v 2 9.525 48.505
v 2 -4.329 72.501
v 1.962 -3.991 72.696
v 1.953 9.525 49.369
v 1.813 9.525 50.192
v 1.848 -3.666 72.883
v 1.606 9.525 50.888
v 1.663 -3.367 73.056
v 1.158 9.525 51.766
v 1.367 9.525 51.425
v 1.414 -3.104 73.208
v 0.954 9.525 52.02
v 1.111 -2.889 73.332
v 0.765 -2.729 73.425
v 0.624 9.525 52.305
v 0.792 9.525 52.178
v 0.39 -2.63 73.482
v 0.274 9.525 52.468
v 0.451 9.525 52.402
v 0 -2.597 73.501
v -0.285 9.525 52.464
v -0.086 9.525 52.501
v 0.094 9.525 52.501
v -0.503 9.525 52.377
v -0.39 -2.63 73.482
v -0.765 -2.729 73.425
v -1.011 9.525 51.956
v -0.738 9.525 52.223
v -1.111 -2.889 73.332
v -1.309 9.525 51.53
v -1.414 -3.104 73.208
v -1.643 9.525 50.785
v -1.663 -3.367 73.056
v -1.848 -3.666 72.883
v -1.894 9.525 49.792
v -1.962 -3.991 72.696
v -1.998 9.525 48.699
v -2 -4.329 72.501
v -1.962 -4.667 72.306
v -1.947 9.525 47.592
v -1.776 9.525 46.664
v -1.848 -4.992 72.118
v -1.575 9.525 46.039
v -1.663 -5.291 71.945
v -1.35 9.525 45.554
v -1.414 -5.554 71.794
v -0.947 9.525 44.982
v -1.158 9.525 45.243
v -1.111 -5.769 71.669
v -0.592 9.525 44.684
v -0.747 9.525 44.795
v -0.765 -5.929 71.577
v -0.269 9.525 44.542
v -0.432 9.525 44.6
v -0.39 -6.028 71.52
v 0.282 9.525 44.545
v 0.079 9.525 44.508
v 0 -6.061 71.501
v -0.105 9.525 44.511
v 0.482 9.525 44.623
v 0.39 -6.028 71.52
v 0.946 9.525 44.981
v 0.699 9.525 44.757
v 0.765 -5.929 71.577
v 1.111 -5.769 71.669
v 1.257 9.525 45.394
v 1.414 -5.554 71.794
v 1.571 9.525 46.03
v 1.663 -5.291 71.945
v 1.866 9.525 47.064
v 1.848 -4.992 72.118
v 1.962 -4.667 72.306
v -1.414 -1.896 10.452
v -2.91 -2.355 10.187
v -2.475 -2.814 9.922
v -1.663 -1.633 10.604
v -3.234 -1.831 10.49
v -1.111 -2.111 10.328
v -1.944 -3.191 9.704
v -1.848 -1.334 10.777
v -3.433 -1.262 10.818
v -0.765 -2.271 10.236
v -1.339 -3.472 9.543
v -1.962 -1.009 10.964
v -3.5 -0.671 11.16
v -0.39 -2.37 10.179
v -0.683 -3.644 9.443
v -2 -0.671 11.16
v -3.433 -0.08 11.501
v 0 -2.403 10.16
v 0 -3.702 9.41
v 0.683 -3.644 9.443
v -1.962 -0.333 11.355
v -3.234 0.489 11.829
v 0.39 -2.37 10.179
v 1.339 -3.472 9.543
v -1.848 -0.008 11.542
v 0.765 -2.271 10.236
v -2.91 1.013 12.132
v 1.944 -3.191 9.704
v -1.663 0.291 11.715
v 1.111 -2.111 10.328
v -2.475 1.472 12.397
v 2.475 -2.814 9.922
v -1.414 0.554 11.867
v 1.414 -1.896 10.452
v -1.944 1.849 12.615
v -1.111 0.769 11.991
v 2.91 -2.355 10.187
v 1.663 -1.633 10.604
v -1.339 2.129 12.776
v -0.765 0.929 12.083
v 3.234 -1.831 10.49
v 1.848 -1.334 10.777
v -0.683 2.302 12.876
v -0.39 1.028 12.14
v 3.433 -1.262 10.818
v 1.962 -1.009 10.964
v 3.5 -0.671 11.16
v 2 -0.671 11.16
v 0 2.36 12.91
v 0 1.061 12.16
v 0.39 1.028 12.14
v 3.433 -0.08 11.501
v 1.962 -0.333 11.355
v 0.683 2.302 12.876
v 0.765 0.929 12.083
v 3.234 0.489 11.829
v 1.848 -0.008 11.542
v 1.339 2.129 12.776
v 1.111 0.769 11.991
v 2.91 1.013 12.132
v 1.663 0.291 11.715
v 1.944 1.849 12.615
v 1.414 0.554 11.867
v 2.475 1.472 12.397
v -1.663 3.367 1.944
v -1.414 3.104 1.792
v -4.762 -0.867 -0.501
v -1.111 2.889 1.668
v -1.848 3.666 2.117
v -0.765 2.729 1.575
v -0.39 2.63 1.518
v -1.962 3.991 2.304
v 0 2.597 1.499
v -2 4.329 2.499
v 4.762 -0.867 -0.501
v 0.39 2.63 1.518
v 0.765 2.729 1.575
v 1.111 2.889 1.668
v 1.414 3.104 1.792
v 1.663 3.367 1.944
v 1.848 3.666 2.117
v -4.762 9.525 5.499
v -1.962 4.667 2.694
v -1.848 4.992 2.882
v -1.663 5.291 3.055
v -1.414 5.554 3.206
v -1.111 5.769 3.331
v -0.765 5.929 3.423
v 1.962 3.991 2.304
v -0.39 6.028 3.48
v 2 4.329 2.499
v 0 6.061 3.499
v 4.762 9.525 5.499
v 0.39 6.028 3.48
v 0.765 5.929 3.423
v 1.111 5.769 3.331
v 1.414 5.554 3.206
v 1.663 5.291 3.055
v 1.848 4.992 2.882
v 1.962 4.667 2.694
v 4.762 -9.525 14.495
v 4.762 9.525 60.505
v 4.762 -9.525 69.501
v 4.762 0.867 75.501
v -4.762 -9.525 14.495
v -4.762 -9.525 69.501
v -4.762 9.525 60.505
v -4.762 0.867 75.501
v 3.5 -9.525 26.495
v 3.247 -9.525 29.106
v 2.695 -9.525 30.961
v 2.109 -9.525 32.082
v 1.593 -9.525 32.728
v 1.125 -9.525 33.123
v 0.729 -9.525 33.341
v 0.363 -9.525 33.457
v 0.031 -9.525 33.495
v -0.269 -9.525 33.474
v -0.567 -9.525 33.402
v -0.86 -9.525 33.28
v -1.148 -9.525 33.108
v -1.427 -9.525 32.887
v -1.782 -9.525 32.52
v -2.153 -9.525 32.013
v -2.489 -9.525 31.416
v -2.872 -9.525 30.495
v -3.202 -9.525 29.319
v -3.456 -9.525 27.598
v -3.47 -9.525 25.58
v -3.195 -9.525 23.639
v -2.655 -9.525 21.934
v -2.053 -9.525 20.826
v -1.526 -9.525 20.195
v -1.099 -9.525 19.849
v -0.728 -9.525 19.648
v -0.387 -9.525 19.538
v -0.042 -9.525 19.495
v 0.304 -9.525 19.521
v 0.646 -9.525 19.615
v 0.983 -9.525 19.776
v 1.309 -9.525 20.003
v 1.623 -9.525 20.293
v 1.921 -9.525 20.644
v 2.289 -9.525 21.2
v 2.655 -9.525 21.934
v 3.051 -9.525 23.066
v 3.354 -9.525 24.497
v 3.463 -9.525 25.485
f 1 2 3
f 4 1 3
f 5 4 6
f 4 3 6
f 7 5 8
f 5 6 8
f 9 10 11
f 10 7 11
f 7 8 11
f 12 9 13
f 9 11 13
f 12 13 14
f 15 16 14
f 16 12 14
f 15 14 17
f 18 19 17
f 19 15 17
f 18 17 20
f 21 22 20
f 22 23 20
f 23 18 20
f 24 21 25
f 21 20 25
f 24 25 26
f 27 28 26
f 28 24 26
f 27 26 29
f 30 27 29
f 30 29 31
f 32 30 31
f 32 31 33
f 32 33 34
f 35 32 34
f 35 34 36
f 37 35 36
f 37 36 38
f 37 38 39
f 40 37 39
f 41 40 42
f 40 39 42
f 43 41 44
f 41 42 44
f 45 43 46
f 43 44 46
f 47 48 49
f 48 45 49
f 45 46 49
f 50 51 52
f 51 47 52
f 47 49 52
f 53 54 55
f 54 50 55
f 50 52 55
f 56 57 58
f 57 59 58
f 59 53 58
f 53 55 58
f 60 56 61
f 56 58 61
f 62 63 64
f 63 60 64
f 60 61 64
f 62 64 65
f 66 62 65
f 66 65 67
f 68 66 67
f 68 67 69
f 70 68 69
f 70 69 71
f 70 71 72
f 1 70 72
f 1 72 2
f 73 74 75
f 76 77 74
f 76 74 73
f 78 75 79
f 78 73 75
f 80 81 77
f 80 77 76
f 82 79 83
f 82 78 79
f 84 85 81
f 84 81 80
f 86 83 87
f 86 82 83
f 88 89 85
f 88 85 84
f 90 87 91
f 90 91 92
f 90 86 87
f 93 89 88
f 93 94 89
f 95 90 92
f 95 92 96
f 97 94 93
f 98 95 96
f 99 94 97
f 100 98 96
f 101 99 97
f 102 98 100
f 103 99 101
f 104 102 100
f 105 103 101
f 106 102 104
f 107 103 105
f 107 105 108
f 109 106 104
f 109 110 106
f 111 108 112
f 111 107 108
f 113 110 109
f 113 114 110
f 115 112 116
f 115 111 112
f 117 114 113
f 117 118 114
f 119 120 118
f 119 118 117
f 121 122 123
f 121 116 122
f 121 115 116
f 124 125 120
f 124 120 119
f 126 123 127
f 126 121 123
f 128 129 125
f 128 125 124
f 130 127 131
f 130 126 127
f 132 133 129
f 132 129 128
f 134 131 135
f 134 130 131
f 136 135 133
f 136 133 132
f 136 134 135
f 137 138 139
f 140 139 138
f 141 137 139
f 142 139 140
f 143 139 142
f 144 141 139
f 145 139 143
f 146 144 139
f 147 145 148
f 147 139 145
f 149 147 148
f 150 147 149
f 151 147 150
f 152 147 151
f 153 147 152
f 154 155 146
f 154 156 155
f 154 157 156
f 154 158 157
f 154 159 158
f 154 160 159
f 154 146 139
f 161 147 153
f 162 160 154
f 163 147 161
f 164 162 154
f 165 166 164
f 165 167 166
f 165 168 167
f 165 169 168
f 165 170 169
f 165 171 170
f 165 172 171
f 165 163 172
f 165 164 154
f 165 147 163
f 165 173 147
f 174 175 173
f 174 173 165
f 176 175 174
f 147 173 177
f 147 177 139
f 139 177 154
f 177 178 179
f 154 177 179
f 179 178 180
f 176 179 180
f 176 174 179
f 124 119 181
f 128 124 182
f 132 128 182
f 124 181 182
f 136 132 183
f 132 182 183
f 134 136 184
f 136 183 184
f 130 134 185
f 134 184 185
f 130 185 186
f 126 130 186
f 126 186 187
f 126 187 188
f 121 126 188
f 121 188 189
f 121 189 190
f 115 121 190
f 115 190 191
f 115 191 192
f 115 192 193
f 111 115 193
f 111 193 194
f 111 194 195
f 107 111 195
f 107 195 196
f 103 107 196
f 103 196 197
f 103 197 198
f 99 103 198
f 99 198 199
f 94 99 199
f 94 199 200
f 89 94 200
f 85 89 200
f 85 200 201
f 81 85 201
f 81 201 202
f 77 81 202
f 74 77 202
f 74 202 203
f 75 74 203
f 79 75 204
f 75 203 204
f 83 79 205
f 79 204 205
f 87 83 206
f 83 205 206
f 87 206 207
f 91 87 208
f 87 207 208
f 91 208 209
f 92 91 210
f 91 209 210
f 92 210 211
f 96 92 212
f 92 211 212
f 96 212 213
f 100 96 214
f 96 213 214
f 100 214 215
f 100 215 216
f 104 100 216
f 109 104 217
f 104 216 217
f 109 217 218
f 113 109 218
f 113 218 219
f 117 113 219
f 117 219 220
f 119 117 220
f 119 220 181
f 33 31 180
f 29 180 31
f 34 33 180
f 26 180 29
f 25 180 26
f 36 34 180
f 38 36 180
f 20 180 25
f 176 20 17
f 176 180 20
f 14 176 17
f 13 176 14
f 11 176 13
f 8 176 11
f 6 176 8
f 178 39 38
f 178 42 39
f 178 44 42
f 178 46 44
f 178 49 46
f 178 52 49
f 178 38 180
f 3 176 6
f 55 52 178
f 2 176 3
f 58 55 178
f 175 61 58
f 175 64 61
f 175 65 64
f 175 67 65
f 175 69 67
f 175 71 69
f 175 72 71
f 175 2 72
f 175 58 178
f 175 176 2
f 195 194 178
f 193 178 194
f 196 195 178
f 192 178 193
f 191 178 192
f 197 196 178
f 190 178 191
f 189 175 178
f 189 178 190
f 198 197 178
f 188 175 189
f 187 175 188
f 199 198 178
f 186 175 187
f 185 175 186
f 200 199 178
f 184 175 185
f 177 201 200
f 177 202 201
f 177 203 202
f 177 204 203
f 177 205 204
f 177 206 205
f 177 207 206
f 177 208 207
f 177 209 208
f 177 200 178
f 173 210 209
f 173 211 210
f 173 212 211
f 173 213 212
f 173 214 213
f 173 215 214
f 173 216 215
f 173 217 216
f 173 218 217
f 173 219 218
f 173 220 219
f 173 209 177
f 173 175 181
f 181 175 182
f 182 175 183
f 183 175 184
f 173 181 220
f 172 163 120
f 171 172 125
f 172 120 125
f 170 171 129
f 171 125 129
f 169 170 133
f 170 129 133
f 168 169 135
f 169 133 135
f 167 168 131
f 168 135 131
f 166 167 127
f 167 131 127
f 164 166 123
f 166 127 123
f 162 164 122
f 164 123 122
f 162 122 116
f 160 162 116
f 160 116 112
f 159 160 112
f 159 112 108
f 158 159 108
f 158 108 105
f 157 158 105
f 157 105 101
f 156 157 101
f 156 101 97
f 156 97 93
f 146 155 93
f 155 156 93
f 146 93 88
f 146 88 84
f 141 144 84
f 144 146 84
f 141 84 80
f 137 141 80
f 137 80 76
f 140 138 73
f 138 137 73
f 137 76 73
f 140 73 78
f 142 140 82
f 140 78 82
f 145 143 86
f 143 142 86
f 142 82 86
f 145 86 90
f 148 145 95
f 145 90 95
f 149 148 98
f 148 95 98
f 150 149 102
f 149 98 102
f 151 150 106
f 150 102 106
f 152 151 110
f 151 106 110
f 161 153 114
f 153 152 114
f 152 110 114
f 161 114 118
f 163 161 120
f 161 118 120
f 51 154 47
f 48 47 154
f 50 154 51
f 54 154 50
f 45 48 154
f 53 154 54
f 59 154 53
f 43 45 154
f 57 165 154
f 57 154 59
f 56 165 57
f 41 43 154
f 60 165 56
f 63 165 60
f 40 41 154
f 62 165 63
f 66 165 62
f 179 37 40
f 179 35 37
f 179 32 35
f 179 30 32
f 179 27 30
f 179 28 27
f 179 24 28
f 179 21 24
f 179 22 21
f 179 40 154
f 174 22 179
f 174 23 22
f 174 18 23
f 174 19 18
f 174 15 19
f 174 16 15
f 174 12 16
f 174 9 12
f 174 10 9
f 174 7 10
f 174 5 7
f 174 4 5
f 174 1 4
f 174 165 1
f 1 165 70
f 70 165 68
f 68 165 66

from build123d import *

# Parameters (mm, degrees)
F1_DEPTH = 4.7625
F2_R     = 2
F3_DEPTH = 50
F4_R     = 3.5
F4_R_2   = 2
F5_DEPTH = 40
F6_R     = 2
F7_DEPTH = 15.1971524227
F8_R     = 2
F9_DEPTH = 70.1490577065


# Not quite as in the source:
# - a length typed as a fraction of an inch, garbled in the dataset ("3 / 203.2 mm" for 3/8 in), is restored


with BuildPart() as f1:
    # F0 (on Right) → F1 (new body, symmetric)
    with BuildSketch(Plane.YZ):
        Polygon((0.8673048454, 75.500738686), (-9.525, 69.500738686), (-9.525, 14.4948291982), (-0.8673048454, -0.500738686), (9.525, 5.499261314), (9.525, 60.5051708018), align=None)
    extrude(amount=F1_DEPTH, both=True)

    # F2 (on face) → F3 (join)
    with BuildSketch(Plane(origin=(0, 0, 0), x_dir=(1, 0, 0), z_dir=(0, 0.5, -0.8660254038))):
        with Locations((0, -4.9985226281)):
            Circle(F2_R)
    extrude(amount=-F3_DEPTH)

    # F4 (on face) → F5 (cut)
    with BuildSketch(Plane(origin=(0, -25, 43.3012701892), x_dir=(1, 0, 0), z_dir=(0, -0.5, 0.8660254038))):
        with Locations((0, 4.9985226281)):
            Circle(F4_R)
        with Locations((0, 4.9985226281)):
            Circle(F4_R_2, mode=Mode.SUBTRACT)
        with Locations((0, 4.9985226281)):
            Circle(F4_R_2)
    extrude(amount=-F5_DEPTH, mode=Mode.SUBTRACT)

    # F6 (on face) → F7 (cut, through all)
    with BuildSketch(Plane(origin=(0, -5, 8.6602540378), x_dir=(1, 0, 0), z_dir=(0, -0.5, 0.8660254038))):
        with Locations((0, 4.9985226281)):
            Circle(F6_R)
    extrude(amount=-F7_DEPTH, mode=Mode.SUBTRACT)

    # F8 (on face) → F9 (cut, through all)
    with BuildSketch(Plane(origin=(0, -32.4759526419, 56.25), x_dir=(1, 0, 0), z_dir=(0, -0.5, 0.8660254038))):
        with Locations((0, 32.5014773719)):
            Circle(F8_R)
    extrude(amount=-F9_DEPTH, mode=Mode.SUBTRACT)


solid = f1.part
